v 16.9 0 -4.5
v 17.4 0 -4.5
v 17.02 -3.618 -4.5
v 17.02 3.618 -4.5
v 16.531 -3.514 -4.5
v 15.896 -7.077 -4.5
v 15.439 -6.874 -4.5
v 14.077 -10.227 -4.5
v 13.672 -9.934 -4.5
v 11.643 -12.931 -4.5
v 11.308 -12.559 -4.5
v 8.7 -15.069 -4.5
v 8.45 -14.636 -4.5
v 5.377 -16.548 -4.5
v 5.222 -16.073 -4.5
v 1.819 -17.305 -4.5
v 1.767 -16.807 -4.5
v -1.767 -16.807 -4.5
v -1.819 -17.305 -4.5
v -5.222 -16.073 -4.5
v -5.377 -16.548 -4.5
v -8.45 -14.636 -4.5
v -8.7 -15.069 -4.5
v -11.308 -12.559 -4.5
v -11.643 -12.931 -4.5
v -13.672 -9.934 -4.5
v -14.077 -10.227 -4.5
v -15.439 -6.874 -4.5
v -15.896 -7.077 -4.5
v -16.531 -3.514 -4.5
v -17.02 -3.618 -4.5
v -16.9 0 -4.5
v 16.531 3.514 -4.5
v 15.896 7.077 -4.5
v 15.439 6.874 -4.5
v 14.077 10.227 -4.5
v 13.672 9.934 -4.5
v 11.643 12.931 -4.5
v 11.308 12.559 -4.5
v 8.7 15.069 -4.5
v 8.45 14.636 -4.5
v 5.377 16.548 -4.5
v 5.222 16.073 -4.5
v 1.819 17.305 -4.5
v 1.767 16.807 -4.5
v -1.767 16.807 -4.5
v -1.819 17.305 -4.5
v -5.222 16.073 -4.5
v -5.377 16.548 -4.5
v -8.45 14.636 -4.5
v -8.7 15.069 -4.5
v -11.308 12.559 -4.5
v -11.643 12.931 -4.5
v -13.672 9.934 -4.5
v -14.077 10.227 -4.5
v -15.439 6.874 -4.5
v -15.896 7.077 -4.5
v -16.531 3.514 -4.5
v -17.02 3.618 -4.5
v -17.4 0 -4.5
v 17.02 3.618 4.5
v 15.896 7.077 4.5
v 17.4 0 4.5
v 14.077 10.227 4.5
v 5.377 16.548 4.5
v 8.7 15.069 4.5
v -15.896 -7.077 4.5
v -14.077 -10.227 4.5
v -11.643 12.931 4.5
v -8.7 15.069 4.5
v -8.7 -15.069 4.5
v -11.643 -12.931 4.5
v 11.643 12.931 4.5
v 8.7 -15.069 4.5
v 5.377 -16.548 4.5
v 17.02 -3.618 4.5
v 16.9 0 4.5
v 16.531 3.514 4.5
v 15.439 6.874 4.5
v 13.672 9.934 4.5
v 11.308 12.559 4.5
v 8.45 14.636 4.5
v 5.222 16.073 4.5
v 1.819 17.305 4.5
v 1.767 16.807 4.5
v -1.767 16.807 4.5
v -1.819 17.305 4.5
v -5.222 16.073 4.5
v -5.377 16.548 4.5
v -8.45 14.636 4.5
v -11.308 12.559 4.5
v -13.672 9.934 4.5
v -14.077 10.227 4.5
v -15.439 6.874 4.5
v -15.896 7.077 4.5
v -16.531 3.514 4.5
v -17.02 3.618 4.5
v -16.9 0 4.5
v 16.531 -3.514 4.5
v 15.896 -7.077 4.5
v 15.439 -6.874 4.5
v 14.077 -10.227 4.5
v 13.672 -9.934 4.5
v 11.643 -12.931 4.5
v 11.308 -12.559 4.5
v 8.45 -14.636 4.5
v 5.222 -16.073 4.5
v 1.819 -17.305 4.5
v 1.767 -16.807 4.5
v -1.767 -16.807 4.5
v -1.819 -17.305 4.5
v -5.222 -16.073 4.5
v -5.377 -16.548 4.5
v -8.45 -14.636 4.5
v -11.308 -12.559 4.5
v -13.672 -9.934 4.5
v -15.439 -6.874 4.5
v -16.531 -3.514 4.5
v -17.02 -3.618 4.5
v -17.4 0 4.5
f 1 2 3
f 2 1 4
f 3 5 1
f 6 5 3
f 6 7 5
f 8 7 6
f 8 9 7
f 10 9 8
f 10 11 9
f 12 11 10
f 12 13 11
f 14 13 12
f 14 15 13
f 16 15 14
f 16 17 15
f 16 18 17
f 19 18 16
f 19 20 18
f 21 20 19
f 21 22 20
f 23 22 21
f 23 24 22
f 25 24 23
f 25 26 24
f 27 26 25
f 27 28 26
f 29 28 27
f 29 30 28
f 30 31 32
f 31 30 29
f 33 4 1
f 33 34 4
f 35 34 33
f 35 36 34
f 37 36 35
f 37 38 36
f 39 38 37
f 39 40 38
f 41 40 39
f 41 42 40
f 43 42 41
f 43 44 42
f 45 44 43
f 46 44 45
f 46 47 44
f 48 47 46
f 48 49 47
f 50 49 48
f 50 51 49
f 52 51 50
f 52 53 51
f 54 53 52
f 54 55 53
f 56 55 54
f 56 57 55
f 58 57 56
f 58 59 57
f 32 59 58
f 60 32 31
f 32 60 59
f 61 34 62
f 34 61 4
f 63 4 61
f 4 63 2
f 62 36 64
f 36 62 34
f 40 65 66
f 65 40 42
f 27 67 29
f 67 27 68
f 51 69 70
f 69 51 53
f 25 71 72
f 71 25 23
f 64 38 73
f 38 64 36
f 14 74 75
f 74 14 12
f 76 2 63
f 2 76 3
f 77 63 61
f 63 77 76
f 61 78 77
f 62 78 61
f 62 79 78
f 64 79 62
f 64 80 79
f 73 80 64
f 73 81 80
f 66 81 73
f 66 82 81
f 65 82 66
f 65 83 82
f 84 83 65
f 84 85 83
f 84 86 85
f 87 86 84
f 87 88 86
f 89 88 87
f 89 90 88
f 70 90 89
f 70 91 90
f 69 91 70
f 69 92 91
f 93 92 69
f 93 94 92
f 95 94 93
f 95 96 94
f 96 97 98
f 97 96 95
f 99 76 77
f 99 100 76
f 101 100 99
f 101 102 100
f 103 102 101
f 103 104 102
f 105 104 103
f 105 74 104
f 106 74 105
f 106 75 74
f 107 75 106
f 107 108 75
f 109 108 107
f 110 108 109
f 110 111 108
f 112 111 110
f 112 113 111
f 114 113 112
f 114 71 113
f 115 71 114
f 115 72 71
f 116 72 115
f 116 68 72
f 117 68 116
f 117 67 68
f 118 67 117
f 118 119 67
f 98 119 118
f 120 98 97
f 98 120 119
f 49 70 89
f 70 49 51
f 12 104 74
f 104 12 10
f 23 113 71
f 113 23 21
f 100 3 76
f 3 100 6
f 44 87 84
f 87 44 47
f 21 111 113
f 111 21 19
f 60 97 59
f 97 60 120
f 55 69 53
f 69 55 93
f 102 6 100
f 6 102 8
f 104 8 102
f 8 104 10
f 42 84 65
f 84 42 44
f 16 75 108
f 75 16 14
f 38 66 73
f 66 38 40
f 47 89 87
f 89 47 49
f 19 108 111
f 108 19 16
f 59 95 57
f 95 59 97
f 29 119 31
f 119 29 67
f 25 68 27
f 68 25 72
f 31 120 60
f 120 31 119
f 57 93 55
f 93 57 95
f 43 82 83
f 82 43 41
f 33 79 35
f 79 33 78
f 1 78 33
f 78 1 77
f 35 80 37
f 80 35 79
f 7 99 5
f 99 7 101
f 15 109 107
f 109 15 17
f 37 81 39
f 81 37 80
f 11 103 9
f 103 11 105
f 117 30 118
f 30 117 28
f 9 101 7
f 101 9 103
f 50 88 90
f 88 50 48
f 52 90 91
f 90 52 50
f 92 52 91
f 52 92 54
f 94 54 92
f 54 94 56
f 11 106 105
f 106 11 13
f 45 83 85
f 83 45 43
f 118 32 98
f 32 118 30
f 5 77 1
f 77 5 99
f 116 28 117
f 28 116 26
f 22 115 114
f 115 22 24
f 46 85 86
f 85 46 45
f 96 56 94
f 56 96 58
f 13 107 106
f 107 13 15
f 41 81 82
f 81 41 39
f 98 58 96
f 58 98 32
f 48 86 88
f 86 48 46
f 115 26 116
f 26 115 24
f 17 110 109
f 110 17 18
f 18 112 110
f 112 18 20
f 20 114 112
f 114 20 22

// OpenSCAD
// Parameters
outer_radius = 17.4; //[8.7:34.8:0.1]
inner_radius = 11.4; //[5.7:22.8:0.1]
height = 9.0; //[4.5:18.0:0.1]
wall_thickness = 0.5; //[0.25:1.0:0.05]
overlap = 1.0; //[0.5:2.0:0.1]

// Geometry
module radial_main_body_outer() {
  cylinder(h=height, r=outer_radius, center=true);
}

module radial_main_body_inner_void() {
  cylinder(h=height + 2*overlap, r=outer_radius - wall_thickness, center=true);
}

// Final Output
difference() {
  radial_main_body_outer();
  radial_main_body_inner_void();
}
